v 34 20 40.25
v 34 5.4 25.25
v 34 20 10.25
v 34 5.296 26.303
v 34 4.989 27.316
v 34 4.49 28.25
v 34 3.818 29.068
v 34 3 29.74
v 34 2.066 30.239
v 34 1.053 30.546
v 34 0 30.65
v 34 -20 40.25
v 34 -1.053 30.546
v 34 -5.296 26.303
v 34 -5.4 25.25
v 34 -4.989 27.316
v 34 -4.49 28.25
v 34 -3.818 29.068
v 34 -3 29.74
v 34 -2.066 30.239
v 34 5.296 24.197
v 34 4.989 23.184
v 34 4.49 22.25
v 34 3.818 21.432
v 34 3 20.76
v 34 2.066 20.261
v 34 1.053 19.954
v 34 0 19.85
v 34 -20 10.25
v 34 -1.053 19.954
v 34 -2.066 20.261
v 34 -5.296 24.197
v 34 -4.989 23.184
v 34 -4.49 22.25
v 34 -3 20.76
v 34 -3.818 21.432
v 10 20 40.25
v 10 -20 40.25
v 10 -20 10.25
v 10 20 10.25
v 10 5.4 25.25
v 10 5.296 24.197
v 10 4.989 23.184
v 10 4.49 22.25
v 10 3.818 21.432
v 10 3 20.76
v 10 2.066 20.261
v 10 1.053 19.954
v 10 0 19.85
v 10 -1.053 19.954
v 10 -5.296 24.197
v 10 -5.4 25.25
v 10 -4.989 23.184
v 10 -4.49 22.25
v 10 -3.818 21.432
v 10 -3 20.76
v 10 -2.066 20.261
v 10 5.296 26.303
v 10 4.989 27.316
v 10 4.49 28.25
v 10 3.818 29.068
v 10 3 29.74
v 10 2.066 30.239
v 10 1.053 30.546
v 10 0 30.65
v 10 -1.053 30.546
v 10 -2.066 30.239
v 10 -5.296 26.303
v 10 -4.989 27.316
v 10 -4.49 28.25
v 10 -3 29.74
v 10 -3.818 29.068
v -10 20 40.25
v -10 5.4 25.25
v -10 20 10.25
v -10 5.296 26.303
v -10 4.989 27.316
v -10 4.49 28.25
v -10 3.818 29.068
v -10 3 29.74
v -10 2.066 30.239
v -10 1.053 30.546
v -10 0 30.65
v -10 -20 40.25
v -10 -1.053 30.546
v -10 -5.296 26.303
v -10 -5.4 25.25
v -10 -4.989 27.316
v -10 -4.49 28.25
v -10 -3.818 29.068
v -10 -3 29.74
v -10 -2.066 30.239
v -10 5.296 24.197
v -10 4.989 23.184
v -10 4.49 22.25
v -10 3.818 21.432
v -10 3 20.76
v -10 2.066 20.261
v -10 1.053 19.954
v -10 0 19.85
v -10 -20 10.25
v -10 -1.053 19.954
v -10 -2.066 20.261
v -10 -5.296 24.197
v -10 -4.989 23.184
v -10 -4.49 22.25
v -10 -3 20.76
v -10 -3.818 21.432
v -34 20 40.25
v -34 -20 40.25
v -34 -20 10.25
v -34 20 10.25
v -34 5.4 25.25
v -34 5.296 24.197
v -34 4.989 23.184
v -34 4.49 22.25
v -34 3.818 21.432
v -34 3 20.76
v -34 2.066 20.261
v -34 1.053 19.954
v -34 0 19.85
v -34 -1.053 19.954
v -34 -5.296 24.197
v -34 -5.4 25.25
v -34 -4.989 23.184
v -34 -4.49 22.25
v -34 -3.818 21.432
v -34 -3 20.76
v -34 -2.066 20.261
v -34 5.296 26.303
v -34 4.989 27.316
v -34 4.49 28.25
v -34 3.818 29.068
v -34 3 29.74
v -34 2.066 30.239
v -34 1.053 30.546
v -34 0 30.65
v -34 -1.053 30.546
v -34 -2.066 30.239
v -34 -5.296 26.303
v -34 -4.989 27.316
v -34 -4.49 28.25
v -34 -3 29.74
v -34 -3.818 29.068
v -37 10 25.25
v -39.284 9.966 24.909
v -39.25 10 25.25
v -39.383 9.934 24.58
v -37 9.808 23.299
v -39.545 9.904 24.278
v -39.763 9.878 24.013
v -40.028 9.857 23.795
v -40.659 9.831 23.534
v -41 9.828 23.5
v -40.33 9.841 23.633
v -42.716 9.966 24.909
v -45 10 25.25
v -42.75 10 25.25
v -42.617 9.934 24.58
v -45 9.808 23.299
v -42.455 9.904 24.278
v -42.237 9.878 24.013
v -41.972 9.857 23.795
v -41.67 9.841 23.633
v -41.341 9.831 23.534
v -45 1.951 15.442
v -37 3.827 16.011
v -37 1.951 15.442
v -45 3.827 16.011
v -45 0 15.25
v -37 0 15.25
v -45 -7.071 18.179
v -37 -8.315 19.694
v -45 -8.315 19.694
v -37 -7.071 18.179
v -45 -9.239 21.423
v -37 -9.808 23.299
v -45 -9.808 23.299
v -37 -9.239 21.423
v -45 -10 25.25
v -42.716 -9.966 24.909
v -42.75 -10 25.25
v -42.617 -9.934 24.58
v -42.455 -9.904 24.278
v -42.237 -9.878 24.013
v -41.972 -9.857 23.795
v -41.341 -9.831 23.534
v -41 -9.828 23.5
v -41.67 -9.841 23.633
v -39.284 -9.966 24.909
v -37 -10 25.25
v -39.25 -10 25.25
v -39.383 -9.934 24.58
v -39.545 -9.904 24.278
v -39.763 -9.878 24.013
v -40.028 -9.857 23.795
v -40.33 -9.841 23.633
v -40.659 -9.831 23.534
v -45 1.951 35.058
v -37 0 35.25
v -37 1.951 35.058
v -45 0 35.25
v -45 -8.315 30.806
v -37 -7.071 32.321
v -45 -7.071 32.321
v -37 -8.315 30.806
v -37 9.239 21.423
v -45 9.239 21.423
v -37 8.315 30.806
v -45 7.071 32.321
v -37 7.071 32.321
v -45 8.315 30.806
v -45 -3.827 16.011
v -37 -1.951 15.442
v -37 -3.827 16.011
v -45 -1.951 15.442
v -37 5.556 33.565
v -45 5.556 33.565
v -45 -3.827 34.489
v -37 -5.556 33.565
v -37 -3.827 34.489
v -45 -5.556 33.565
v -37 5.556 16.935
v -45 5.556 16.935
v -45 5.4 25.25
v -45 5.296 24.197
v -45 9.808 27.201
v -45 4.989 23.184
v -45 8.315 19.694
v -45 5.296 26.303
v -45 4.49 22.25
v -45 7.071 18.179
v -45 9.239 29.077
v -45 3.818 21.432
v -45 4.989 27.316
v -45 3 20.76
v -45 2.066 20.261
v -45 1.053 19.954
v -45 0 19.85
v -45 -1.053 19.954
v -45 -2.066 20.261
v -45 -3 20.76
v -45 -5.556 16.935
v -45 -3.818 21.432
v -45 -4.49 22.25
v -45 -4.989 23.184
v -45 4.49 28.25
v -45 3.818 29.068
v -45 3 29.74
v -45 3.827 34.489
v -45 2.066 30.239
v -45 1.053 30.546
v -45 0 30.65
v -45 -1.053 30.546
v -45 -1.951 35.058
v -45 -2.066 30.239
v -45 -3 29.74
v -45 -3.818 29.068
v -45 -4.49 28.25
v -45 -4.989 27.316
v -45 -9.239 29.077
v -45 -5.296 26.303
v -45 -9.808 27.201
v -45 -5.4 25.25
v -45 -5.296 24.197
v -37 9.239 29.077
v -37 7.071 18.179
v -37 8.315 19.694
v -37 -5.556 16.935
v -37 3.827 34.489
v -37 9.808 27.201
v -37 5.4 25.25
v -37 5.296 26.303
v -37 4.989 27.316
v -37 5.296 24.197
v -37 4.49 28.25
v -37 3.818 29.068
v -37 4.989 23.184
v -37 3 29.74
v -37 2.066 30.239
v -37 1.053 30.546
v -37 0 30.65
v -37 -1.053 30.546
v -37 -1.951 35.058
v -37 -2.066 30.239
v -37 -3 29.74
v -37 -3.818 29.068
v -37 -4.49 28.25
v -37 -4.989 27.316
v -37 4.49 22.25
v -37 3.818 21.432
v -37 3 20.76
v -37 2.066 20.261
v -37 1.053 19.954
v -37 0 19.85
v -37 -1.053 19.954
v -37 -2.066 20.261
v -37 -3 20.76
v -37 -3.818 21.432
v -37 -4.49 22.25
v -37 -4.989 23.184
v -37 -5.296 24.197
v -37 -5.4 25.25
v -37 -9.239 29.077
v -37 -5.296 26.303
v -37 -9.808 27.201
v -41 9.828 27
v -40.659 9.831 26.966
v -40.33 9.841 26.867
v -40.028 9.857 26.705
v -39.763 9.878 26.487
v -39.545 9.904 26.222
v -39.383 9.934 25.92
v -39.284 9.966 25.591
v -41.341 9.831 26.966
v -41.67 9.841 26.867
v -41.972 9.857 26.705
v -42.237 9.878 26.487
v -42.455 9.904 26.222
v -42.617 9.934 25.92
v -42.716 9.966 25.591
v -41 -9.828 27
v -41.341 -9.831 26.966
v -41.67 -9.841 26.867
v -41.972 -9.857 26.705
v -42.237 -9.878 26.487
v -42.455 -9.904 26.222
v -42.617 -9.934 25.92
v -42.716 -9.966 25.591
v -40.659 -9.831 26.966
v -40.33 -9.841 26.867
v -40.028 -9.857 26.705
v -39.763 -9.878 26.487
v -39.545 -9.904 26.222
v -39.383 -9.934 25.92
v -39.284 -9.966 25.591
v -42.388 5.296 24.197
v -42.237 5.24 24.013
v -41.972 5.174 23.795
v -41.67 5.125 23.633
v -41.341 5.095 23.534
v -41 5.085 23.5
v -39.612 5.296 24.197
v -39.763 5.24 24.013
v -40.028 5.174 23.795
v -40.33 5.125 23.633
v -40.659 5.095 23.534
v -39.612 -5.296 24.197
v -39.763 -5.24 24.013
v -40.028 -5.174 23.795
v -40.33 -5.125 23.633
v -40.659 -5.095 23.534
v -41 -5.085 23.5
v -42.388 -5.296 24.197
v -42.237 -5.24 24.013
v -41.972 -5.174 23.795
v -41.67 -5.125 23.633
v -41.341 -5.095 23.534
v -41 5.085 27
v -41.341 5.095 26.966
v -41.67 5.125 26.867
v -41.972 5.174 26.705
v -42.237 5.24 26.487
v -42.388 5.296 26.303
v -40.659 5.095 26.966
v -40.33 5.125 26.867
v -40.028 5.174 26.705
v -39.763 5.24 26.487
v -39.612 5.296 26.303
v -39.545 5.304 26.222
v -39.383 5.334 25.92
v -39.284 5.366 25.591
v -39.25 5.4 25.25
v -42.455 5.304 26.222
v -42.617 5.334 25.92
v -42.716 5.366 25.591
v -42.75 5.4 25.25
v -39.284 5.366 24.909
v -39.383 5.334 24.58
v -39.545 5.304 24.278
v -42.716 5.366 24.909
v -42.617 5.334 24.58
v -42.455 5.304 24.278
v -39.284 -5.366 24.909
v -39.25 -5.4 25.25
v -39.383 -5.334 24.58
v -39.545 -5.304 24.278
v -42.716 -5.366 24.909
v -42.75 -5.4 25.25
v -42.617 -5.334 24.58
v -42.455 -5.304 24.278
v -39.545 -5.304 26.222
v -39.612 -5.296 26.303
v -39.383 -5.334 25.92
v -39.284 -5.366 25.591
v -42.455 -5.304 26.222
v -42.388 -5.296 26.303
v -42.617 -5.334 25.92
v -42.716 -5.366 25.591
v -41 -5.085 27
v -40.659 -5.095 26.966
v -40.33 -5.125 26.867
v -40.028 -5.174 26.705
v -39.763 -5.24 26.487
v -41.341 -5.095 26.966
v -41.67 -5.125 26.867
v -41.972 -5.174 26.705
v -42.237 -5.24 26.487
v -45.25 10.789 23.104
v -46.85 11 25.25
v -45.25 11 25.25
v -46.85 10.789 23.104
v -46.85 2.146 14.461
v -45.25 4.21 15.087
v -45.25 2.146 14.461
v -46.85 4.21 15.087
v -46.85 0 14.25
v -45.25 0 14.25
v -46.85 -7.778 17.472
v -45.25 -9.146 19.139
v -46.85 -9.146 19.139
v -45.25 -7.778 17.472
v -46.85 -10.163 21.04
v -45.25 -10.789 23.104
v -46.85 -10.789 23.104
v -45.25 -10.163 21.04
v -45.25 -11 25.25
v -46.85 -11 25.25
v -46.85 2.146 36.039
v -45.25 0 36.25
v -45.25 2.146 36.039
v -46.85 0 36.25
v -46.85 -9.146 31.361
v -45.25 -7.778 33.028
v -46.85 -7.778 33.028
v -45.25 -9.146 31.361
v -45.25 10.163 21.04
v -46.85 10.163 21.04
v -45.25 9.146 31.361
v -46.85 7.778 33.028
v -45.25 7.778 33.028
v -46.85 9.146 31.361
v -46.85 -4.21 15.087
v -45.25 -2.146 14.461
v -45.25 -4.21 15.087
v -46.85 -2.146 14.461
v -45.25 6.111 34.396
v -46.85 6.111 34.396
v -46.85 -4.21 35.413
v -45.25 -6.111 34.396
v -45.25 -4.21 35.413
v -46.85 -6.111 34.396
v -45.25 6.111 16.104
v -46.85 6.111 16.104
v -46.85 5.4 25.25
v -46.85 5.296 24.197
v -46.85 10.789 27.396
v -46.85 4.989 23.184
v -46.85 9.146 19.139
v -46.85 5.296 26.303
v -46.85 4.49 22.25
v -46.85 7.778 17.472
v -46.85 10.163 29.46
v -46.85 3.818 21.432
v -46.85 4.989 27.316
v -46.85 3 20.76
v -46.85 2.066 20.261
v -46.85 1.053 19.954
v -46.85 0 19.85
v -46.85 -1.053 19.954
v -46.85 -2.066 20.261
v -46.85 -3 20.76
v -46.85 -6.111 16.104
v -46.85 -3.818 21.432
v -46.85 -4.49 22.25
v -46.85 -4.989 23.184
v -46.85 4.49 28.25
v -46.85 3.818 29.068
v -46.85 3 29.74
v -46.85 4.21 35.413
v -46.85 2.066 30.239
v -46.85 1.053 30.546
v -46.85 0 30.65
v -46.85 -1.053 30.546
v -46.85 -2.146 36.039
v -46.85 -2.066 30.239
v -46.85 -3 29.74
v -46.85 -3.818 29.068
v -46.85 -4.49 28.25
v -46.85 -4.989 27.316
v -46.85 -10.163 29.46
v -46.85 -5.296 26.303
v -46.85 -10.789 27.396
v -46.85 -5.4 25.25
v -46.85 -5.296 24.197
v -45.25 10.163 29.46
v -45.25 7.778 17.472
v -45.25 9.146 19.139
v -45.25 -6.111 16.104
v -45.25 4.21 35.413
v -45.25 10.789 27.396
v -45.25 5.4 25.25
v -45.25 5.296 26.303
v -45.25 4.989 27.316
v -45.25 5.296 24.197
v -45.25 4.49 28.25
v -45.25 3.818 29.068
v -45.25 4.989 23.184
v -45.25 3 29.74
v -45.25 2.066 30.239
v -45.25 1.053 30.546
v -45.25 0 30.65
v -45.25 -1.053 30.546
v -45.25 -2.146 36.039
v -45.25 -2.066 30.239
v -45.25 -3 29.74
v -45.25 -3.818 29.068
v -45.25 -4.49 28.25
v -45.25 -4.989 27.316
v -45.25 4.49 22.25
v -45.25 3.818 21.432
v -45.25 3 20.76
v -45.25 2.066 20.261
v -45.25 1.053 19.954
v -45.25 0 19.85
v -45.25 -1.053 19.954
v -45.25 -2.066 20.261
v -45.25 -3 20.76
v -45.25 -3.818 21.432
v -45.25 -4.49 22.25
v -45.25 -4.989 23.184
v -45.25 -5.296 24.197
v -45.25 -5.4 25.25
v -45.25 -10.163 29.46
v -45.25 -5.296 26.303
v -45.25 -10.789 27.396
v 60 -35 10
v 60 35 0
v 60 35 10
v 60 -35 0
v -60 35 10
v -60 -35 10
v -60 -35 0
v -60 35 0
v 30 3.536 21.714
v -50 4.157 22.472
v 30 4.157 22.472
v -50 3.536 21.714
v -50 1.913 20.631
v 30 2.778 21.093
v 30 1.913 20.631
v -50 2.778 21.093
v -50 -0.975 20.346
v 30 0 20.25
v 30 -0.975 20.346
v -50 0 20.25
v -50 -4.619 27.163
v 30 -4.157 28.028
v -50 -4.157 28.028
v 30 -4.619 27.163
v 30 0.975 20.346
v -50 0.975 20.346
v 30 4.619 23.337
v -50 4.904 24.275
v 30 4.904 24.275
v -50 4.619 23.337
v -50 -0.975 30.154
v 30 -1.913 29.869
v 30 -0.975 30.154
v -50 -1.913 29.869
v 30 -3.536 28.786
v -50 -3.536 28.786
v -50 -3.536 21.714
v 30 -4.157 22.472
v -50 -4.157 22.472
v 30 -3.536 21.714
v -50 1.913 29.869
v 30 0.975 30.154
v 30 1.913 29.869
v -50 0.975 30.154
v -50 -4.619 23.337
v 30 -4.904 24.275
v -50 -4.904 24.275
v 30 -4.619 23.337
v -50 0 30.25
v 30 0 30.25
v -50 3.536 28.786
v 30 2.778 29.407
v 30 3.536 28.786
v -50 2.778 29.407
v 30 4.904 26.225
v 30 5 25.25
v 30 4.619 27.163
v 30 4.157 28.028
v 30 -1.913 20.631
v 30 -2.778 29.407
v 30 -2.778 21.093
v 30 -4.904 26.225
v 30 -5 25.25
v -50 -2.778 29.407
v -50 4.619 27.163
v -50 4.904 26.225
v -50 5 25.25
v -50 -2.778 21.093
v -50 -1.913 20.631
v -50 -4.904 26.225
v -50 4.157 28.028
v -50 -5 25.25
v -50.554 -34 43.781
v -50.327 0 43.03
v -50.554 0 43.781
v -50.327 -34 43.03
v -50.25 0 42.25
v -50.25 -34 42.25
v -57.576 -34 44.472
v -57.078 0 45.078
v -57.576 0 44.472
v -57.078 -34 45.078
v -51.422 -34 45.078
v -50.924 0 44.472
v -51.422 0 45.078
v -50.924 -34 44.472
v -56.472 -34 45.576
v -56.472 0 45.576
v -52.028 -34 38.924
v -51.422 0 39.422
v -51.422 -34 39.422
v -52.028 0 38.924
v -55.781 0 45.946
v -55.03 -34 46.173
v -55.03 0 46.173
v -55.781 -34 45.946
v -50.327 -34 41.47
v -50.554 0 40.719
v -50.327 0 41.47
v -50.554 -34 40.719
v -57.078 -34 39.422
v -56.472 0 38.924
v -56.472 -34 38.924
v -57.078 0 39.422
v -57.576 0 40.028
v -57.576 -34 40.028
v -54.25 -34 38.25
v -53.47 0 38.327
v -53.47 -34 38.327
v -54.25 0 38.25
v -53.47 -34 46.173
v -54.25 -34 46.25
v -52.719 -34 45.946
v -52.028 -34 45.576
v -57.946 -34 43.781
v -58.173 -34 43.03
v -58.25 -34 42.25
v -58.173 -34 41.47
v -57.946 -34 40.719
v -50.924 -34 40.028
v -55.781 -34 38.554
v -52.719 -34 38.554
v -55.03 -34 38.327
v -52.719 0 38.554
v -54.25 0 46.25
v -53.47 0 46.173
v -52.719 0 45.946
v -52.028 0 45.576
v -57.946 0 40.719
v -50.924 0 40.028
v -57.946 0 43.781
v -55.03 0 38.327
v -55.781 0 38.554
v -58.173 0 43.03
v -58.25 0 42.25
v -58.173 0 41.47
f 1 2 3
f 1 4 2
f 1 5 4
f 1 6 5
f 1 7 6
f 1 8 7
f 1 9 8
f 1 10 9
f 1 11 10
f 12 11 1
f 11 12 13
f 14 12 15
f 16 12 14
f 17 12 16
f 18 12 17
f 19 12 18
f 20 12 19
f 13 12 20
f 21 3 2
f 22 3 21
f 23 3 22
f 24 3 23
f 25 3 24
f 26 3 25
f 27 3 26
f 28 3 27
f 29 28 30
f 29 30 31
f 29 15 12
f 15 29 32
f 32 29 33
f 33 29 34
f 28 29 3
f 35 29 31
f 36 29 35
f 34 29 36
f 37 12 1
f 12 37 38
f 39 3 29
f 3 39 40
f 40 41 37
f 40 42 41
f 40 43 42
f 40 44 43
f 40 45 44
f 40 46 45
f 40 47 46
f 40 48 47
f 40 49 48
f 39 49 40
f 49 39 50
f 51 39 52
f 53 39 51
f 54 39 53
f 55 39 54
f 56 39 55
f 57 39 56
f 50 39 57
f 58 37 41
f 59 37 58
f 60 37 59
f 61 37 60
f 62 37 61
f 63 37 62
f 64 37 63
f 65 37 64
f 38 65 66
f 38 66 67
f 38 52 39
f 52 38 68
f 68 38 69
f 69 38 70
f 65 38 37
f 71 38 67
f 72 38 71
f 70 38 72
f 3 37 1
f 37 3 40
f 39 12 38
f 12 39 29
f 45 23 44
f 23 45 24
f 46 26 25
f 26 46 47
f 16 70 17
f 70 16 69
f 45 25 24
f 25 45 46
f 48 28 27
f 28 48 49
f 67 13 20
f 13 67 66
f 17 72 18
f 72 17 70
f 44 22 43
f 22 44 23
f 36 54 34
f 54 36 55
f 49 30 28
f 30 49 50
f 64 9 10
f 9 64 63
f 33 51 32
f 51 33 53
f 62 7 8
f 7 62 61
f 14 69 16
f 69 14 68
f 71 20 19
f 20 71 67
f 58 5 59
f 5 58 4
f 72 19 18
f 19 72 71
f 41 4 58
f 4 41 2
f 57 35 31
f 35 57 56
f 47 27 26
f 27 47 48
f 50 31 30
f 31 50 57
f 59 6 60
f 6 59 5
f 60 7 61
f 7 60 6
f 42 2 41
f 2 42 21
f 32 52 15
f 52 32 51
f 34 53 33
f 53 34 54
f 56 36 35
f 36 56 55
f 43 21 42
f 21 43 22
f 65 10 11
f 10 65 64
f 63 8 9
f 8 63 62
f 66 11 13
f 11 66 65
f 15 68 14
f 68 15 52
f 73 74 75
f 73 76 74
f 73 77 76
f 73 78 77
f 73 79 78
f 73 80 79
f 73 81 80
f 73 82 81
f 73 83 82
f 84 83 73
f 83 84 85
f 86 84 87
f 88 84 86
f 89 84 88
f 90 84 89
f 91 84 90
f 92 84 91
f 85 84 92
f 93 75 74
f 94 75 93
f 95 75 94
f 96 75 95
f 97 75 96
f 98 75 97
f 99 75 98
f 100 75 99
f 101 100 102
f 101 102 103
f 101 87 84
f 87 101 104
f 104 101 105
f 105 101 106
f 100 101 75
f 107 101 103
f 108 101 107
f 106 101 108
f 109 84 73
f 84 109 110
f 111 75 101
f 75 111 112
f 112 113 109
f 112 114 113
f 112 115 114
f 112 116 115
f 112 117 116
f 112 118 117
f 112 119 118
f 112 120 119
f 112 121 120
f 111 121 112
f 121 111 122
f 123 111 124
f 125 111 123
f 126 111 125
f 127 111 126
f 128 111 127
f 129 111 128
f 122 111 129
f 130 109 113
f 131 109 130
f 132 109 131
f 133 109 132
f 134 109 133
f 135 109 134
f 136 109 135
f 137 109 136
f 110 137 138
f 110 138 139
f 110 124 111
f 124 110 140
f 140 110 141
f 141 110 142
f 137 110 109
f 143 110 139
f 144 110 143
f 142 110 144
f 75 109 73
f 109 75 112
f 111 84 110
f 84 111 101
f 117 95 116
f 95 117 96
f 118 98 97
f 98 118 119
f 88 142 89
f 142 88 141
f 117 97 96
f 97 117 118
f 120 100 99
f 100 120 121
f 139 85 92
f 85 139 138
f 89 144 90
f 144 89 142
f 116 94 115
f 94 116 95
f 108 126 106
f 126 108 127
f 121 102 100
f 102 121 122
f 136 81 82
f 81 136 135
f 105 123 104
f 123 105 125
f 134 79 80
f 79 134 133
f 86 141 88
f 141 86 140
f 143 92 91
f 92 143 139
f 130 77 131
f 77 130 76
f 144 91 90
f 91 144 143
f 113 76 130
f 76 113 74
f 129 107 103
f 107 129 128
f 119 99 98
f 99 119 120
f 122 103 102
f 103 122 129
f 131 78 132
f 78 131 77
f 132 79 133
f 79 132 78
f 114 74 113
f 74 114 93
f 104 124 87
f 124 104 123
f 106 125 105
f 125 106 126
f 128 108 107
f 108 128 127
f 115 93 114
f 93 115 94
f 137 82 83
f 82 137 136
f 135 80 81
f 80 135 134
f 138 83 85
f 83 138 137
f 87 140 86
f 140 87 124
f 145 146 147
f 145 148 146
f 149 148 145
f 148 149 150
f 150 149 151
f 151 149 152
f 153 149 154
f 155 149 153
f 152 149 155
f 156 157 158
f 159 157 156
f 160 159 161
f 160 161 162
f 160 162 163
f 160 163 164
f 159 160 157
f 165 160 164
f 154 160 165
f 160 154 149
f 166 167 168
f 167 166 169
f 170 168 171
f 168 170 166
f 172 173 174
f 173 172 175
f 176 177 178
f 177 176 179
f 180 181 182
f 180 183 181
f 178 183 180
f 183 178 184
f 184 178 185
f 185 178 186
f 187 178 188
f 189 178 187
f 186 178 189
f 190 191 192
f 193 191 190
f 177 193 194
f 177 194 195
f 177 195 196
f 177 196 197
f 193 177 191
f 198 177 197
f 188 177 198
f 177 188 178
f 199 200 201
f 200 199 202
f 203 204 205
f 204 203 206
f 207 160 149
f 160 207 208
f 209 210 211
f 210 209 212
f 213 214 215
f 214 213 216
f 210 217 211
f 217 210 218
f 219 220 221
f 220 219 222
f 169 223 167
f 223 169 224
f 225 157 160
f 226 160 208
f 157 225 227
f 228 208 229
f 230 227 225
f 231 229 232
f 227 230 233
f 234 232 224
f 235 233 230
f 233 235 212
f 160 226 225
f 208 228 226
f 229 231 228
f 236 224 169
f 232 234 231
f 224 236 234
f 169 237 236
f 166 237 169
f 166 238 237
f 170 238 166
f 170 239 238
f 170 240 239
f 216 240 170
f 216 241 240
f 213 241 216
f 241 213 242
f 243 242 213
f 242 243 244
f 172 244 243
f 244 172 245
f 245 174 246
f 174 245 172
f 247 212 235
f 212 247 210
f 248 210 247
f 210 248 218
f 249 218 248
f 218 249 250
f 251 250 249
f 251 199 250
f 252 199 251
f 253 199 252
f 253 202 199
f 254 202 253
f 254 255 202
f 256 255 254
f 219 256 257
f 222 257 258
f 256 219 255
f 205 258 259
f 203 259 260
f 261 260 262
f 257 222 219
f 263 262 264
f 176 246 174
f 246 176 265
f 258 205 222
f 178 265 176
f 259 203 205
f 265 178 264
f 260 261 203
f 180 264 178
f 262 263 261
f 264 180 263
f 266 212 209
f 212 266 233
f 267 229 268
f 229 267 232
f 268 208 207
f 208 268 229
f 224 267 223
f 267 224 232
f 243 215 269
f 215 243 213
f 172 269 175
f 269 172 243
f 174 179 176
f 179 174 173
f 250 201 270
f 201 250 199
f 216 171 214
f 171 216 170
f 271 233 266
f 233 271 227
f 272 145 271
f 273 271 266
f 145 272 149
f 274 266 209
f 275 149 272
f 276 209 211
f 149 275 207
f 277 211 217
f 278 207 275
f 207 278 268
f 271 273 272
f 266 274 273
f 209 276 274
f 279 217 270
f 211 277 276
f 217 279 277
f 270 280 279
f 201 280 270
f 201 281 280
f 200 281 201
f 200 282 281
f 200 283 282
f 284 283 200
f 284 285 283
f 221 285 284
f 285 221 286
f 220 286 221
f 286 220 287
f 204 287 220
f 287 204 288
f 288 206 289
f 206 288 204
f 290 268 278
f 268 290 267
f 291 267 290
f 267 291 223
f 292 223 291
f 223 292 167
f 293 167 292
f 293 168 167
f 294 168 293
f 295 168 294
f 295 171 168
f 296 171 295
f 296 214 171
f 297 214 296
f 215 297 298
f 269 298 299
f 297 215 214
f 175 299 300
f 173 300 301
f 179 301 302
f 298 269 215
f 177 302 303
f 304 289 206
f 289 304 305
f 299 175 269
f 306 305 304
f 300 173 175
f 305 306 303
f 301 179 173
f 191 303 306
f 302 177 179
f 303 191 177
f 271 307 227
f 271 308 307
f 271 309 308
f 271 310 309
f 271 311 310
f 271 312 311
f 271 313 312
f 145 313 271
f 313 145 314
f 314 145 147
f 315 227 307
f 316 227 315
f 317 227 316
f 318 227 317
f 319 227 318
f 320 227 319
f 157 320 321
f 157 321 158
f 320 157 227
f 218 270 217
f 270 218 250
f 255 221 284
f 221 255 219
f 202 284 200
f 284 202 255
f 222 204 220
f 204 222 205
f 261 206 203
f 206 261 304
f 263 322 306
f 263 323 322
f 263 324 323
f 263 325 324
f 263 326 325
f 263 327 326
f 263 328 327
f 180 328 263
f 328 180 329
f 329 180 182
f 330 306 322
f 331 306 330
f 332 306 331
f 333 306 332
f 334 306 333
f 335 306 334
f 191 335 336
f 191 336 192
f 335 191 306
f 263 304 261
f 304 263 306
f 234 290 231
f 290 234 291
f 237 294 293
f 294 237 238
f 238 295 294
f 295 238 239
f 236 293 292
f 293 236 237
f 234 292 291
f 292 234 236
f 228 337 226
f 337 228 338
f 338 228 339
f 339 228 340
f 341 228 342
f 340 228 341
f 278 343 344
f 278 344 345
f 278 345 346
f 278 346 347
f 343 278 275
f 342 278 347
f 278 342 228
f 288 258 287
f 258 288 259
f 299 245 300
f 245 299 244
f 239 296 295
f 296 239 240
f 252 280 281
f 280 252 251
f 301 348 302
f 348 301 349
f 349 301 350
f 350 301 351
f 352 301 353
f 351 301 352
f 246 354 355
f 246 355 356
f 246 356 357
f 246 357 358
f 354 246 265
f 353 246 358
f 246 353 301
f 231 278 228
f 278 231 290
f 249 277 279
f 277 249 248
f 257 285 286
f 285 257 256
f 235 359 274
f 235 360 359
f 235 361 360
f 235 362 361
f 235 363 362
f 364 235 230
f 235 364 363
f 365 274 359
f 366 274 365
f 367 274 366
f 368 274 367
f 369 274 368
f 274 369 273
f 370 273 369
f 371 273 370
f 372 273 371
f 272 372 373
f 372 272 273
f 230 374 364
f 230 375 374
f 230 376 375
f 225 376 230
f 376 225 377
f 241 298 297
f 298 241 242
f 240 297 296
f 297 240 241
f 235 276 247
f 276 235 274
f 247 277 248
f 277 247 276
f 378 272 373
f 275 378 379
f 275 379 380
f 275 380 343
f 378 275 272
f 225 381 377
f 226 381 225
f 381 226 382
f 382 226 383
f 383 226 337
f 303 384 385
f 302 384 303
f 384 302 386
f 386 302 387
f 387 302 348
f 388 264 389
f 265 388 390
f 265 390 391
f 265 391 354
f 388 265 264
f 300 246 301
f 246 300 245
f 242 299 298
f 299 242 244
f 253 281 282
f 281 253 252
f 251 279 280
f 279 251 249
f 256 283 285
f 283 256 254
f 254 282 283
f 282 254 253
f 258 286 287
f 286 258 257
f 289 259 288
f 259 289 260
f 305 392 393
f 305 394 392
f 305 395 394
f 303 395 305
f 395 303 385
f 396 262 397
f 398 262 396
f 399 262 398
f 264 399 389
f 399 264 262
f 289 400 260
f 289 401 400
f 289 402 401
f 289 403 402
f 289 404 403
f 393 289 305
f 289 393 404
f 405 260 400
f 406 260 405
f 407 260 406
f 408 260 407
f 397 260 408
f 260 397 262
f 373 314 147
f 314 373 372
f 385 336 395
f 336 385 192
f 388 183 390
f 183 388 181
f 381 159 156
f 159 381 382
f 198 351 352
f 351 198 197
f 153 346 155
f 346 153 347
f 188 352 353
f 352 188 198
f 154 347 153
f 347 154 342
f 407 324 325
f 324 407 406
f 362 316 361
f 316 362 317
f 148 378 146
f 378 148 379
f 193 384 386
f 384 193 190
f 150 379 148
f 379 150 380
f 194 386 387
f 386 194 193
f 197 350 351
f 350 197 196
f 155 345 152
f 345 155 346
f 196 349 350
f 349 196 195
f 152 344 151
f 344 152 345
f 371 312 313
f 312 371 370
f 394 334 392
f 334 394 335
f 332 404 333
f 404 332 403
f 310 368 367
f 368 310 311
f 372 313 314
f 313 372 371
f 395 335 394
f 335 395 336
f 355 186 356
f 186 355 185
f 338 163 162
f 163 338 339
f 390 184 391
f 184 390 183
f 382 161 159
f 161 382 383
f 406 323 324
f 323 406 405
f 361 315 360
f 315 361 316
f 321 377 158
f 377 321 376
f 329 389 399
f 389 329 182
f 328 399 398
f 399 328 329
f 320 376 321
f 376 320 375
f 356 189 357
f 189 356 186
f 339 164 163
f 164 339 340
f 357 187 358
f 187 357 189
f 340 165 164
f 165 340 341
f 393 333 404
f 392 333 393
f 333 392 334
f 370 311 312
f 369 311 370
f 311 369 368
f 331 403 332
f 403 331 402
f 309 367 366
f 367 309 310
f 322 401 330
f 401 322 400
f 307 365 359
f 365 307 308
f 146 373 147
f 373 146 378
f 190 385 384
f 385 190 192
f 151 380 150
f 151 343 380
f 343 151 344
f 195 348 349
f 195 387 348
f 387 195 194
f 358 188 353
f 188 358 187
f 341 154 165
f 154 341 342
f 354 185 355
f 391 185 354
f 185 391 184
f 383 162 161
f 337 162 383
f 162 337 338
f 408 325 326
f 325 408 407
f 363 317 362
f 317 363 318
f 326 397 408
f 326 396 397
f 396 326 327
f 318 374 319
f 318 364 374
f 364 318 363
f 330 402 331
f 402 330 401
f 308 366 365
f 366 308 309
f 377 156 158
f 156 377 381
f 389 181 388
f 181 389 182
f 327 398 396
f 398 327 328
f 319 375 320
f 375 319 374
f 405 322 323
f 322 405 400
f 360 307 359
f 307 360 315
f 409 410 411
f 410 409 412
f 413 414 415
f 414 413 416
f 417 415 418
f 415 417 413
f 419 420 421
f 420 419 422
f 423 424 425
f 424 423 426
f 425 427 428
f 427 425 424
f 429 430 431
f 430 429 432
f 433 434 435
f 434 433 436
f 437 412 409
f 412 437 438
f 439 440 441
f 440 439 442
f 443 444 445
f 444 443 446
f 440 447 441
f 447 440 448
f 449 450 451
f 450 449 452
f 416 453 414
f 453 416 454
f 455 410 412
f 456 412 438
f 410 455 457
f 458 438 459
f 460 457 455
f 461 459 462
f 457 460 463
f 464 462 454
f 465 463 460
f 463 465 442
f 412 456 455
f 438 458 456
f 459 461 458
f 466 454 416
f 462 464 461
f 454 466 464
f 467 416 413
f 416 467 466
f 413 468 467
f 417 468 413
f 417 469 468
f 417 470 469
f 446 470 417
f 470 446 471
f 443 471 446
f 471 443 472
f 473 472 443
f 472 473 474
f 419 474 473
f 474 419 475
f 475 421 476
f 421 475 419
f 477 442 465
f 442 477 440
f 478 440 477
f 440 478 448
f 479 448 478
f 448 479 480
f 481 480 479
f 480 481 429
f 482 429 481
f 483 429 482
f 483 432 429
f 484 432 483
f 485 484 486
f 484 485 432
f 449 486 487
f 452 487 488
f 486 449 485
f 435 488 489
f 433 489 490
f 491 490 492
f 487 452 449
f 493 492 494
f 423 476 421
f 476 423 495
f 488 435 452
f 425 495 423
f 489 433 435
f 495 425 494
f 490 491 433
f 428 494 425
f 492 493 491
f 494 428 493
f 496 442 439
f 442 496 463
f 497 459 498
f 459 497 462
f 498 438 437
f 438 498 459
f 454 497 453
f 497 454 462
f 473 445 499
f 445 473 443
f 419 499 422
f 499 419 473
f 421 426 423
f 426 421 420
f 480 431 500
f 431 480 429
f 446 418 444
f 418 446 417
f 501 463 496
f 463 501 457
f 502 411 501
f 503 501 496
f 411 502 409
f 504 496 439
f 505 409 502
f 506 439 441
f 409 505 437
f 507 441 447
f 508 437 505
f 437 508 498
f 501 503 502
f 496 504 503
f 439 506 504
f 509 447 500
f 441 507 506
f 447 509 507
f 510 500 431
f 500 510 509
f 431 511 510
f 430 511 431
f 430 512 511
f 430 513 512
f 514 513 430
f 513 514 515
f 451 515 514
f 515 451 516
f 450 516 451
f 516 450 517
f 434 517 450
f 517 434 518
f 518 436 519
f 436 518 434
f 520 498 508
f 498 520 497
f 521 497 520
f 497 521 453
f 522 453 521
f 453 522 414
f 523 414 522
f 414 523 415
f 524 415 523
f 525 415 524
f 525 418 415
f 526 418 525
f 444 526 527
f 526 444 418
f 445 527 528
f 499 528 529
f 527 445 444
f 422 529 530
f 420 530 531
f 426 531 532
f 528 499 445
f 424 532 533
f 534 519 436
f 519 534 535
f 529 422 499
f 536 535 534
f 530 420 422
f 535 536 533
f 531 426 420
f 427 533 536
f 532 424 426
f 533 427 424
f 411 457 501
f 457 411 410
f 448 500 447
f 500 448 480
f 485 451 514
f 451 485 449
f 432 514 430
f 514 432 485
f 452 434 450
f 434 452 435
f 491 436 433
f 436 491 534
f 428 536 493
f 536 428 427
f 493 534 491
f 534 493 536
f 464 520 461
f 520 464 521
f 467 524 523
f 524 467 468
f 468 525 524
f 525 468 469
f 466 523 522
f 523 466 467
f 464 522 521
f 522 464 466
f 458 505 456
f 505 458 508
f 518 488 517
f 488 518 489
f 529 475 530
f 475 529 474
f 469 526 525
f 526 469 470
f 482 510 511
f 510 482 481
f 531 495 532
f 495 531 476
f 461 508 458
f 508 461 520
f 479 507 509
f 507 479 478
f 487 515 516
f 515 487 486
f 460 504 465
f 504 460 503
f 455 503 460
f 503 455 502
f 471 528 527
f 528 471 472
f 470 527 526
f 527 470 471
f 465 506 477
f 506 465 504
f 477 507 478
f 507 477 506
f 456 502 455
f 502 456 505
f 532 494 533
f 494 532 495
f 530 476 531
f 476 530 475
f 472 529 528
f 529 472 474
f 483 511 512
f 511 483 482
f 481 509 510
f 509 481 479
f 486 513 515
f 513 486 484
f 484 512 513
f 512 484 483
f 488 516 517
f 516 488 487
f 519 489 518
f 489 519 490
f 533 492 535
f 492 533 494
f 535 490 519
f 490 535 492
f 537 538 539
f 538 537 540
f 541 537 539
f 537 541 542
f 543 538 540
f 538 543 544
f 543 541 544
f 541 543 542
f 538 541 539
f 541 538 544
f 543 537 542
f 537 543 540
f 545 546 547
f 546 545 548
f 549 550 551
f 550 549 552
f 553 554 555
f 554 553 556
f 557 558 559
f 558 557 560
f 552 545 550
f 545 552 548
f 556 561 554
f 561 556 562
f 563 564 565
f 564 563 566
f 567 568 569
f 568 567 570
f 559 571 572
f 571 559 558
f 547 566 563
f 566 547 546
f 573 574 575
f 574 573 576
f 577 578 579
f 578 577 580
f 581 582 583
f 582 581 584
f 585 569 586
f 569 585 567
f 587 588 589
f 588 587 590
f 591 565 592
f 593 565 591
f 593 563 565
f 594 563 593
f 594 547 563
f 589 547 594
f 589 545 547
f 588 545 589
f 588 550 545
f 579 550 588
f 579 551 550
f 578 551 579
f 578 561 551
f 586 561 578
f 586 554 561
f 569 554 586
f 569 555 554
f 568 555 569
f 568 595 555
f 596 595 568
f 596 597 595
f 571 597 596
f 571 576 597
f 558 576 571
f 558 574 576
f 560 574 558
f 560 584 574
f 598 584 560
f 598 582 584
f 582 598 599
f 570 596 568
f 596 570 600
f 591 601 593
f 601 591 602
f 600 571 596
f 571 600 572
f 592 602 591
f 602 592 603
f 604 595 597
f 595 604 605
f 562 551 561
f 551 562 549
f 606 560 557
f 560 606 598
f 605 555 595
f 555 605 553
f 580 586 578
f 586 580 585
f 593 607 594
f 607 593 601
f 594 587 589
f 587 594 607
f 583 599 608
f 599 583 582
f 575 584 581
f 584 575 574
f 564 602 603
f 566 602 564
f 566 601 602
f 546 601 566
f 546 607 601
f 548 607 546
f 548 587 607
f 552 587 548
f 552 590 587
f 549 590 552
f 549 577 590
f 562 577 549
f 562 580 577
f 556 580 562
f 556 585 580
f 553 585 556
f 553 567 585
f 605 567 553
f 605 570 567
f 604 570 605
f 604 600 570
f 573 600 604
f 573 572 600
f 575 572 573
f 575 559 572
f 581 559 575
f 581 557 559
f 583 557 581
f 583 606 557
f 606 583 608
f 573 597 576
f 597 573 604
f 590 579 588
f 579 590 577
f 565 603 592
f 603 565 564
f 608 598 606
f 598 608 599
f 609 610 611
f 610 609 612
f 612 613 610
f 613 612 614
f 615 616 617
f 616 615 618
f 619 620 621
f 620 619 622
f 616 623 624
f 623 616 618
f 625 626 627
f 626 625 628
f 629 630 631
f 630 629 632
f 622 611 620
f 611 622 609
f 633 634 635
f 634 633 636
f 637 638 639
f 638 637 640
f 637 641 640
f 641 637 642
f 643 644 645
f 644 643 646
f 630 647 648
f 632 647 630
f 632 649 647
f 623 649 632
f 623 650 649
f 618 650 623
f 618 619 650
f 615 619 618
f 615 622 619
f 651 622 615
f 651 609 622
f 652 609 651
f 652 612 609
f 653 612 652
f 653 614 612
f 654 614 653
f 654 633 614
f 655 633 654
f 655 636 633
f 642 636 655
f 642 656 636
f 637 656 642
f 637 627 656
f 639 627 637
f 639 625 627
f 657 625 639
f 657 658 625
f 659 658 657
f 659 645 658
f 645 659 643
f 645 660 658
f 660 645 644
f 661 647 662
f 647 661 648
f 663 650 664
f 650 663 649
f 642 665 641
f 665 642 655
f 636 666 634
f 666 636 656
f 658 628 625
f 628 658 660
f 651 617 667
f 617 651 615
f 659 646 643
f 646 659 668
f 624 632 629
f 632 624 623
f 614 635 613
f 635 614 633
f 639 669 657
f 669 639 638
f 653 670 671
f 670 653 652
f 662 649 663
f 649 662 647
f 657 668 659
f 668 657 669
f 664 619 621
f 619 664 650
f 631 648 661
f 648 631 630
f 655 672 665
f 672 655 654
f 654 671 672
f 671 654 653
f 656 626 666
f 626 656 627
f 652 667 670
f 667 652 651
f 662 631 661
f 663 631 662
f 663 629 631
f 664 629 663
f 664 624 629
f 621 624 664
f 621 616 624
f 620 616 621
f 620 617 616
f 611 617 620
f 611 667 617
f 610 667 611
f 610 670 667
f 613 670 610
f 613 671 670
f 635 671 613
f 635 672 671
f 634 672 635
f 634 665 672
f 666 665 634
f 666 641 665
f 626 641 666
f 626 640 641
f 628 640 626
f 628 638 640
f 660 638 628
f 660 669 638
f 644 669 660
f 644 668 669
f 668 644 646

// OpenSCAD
$fn = 32;

// ------------------------------------------------------------------------
// Machine vise: screw d10, jaws 24 x 30 mm
// Every part is its own module, assembly() places every instance.
// ------------------------------------------------------------------------

// --- part 1 ---
module vise_bed() {
  difference() {
    translate([-60, -35, 0]) cube([120, 70, 10]);
  }
}

// --- part 2 ---
module vise_jaw() {
  difference() {
    translate([-12, -20, 0]) cube([24, 40, 30]);
    translate([0, 0, 15]) rotate([0, 90, 0]) cylinder(h = 26, d = 10.8, center = true);
  }
}

// --- part 3 ---
module vise_screw() {
  translate([0, 0, -40]) cylinder(h = 80, d = 10);
}

// --- part 4 ---
module screw_collar() {
  difference() {
    cylinder(h = 8, d = 20);
    translate([0, 0, -1]) cylinder(h = 10, d = 10.8);
    translate([0, 0, 4]) rotate([90, 0, 0]) cylinder(h = 22, d = 3.5, center = true);
  }
}

// --- part 5 ---
module screw_washer() {
  difference() {
      translate([0, 0, 0]) cylinder(h = 1.6, d = 22);
      translate([0, 0, -1]) cylinder(h = 3.6, d = 10.8);
    }
}

// --- part 6 ---
module vise_handle() {
  cylinder(h = 34, d = 8);
}

// --- assembly ---
module assembly() {
  color([0.80, 0.24, 0.20]) translate([0, 0, 0]) rotate([0, 0, 0]) vise_bed();
  color([0.20, 0.45, 0.75]) translate([22, 0, 10.25]) rotate([0, 0, 0]) vise_jaw();
  color([0.25, 0.62, 0.32]) translate([-22, 0, 10.25]) rotate([0, 0, 0]) vise_jaw();
  color([0.92, 0.70, 0.18]) translate([-10, 0, 25.25]) rotate([0, 90, 0]) vise_screw();
  color([0.58, 0.35, 0.70]) translate([-45, 0, 25.25]) rotate([0, 90, 0]) screw_collar();
  color([0.16, 0.66, 0.66]) translate([-46.85, 0, 25.25]) rotate([0, 90, 0]) screw_washer();
  color([0.85, 0.48, 0.18]) translate([-54.25, 0, 42.25]) rotate([90, 0, 0]) vise_handle();
}

assembly();
